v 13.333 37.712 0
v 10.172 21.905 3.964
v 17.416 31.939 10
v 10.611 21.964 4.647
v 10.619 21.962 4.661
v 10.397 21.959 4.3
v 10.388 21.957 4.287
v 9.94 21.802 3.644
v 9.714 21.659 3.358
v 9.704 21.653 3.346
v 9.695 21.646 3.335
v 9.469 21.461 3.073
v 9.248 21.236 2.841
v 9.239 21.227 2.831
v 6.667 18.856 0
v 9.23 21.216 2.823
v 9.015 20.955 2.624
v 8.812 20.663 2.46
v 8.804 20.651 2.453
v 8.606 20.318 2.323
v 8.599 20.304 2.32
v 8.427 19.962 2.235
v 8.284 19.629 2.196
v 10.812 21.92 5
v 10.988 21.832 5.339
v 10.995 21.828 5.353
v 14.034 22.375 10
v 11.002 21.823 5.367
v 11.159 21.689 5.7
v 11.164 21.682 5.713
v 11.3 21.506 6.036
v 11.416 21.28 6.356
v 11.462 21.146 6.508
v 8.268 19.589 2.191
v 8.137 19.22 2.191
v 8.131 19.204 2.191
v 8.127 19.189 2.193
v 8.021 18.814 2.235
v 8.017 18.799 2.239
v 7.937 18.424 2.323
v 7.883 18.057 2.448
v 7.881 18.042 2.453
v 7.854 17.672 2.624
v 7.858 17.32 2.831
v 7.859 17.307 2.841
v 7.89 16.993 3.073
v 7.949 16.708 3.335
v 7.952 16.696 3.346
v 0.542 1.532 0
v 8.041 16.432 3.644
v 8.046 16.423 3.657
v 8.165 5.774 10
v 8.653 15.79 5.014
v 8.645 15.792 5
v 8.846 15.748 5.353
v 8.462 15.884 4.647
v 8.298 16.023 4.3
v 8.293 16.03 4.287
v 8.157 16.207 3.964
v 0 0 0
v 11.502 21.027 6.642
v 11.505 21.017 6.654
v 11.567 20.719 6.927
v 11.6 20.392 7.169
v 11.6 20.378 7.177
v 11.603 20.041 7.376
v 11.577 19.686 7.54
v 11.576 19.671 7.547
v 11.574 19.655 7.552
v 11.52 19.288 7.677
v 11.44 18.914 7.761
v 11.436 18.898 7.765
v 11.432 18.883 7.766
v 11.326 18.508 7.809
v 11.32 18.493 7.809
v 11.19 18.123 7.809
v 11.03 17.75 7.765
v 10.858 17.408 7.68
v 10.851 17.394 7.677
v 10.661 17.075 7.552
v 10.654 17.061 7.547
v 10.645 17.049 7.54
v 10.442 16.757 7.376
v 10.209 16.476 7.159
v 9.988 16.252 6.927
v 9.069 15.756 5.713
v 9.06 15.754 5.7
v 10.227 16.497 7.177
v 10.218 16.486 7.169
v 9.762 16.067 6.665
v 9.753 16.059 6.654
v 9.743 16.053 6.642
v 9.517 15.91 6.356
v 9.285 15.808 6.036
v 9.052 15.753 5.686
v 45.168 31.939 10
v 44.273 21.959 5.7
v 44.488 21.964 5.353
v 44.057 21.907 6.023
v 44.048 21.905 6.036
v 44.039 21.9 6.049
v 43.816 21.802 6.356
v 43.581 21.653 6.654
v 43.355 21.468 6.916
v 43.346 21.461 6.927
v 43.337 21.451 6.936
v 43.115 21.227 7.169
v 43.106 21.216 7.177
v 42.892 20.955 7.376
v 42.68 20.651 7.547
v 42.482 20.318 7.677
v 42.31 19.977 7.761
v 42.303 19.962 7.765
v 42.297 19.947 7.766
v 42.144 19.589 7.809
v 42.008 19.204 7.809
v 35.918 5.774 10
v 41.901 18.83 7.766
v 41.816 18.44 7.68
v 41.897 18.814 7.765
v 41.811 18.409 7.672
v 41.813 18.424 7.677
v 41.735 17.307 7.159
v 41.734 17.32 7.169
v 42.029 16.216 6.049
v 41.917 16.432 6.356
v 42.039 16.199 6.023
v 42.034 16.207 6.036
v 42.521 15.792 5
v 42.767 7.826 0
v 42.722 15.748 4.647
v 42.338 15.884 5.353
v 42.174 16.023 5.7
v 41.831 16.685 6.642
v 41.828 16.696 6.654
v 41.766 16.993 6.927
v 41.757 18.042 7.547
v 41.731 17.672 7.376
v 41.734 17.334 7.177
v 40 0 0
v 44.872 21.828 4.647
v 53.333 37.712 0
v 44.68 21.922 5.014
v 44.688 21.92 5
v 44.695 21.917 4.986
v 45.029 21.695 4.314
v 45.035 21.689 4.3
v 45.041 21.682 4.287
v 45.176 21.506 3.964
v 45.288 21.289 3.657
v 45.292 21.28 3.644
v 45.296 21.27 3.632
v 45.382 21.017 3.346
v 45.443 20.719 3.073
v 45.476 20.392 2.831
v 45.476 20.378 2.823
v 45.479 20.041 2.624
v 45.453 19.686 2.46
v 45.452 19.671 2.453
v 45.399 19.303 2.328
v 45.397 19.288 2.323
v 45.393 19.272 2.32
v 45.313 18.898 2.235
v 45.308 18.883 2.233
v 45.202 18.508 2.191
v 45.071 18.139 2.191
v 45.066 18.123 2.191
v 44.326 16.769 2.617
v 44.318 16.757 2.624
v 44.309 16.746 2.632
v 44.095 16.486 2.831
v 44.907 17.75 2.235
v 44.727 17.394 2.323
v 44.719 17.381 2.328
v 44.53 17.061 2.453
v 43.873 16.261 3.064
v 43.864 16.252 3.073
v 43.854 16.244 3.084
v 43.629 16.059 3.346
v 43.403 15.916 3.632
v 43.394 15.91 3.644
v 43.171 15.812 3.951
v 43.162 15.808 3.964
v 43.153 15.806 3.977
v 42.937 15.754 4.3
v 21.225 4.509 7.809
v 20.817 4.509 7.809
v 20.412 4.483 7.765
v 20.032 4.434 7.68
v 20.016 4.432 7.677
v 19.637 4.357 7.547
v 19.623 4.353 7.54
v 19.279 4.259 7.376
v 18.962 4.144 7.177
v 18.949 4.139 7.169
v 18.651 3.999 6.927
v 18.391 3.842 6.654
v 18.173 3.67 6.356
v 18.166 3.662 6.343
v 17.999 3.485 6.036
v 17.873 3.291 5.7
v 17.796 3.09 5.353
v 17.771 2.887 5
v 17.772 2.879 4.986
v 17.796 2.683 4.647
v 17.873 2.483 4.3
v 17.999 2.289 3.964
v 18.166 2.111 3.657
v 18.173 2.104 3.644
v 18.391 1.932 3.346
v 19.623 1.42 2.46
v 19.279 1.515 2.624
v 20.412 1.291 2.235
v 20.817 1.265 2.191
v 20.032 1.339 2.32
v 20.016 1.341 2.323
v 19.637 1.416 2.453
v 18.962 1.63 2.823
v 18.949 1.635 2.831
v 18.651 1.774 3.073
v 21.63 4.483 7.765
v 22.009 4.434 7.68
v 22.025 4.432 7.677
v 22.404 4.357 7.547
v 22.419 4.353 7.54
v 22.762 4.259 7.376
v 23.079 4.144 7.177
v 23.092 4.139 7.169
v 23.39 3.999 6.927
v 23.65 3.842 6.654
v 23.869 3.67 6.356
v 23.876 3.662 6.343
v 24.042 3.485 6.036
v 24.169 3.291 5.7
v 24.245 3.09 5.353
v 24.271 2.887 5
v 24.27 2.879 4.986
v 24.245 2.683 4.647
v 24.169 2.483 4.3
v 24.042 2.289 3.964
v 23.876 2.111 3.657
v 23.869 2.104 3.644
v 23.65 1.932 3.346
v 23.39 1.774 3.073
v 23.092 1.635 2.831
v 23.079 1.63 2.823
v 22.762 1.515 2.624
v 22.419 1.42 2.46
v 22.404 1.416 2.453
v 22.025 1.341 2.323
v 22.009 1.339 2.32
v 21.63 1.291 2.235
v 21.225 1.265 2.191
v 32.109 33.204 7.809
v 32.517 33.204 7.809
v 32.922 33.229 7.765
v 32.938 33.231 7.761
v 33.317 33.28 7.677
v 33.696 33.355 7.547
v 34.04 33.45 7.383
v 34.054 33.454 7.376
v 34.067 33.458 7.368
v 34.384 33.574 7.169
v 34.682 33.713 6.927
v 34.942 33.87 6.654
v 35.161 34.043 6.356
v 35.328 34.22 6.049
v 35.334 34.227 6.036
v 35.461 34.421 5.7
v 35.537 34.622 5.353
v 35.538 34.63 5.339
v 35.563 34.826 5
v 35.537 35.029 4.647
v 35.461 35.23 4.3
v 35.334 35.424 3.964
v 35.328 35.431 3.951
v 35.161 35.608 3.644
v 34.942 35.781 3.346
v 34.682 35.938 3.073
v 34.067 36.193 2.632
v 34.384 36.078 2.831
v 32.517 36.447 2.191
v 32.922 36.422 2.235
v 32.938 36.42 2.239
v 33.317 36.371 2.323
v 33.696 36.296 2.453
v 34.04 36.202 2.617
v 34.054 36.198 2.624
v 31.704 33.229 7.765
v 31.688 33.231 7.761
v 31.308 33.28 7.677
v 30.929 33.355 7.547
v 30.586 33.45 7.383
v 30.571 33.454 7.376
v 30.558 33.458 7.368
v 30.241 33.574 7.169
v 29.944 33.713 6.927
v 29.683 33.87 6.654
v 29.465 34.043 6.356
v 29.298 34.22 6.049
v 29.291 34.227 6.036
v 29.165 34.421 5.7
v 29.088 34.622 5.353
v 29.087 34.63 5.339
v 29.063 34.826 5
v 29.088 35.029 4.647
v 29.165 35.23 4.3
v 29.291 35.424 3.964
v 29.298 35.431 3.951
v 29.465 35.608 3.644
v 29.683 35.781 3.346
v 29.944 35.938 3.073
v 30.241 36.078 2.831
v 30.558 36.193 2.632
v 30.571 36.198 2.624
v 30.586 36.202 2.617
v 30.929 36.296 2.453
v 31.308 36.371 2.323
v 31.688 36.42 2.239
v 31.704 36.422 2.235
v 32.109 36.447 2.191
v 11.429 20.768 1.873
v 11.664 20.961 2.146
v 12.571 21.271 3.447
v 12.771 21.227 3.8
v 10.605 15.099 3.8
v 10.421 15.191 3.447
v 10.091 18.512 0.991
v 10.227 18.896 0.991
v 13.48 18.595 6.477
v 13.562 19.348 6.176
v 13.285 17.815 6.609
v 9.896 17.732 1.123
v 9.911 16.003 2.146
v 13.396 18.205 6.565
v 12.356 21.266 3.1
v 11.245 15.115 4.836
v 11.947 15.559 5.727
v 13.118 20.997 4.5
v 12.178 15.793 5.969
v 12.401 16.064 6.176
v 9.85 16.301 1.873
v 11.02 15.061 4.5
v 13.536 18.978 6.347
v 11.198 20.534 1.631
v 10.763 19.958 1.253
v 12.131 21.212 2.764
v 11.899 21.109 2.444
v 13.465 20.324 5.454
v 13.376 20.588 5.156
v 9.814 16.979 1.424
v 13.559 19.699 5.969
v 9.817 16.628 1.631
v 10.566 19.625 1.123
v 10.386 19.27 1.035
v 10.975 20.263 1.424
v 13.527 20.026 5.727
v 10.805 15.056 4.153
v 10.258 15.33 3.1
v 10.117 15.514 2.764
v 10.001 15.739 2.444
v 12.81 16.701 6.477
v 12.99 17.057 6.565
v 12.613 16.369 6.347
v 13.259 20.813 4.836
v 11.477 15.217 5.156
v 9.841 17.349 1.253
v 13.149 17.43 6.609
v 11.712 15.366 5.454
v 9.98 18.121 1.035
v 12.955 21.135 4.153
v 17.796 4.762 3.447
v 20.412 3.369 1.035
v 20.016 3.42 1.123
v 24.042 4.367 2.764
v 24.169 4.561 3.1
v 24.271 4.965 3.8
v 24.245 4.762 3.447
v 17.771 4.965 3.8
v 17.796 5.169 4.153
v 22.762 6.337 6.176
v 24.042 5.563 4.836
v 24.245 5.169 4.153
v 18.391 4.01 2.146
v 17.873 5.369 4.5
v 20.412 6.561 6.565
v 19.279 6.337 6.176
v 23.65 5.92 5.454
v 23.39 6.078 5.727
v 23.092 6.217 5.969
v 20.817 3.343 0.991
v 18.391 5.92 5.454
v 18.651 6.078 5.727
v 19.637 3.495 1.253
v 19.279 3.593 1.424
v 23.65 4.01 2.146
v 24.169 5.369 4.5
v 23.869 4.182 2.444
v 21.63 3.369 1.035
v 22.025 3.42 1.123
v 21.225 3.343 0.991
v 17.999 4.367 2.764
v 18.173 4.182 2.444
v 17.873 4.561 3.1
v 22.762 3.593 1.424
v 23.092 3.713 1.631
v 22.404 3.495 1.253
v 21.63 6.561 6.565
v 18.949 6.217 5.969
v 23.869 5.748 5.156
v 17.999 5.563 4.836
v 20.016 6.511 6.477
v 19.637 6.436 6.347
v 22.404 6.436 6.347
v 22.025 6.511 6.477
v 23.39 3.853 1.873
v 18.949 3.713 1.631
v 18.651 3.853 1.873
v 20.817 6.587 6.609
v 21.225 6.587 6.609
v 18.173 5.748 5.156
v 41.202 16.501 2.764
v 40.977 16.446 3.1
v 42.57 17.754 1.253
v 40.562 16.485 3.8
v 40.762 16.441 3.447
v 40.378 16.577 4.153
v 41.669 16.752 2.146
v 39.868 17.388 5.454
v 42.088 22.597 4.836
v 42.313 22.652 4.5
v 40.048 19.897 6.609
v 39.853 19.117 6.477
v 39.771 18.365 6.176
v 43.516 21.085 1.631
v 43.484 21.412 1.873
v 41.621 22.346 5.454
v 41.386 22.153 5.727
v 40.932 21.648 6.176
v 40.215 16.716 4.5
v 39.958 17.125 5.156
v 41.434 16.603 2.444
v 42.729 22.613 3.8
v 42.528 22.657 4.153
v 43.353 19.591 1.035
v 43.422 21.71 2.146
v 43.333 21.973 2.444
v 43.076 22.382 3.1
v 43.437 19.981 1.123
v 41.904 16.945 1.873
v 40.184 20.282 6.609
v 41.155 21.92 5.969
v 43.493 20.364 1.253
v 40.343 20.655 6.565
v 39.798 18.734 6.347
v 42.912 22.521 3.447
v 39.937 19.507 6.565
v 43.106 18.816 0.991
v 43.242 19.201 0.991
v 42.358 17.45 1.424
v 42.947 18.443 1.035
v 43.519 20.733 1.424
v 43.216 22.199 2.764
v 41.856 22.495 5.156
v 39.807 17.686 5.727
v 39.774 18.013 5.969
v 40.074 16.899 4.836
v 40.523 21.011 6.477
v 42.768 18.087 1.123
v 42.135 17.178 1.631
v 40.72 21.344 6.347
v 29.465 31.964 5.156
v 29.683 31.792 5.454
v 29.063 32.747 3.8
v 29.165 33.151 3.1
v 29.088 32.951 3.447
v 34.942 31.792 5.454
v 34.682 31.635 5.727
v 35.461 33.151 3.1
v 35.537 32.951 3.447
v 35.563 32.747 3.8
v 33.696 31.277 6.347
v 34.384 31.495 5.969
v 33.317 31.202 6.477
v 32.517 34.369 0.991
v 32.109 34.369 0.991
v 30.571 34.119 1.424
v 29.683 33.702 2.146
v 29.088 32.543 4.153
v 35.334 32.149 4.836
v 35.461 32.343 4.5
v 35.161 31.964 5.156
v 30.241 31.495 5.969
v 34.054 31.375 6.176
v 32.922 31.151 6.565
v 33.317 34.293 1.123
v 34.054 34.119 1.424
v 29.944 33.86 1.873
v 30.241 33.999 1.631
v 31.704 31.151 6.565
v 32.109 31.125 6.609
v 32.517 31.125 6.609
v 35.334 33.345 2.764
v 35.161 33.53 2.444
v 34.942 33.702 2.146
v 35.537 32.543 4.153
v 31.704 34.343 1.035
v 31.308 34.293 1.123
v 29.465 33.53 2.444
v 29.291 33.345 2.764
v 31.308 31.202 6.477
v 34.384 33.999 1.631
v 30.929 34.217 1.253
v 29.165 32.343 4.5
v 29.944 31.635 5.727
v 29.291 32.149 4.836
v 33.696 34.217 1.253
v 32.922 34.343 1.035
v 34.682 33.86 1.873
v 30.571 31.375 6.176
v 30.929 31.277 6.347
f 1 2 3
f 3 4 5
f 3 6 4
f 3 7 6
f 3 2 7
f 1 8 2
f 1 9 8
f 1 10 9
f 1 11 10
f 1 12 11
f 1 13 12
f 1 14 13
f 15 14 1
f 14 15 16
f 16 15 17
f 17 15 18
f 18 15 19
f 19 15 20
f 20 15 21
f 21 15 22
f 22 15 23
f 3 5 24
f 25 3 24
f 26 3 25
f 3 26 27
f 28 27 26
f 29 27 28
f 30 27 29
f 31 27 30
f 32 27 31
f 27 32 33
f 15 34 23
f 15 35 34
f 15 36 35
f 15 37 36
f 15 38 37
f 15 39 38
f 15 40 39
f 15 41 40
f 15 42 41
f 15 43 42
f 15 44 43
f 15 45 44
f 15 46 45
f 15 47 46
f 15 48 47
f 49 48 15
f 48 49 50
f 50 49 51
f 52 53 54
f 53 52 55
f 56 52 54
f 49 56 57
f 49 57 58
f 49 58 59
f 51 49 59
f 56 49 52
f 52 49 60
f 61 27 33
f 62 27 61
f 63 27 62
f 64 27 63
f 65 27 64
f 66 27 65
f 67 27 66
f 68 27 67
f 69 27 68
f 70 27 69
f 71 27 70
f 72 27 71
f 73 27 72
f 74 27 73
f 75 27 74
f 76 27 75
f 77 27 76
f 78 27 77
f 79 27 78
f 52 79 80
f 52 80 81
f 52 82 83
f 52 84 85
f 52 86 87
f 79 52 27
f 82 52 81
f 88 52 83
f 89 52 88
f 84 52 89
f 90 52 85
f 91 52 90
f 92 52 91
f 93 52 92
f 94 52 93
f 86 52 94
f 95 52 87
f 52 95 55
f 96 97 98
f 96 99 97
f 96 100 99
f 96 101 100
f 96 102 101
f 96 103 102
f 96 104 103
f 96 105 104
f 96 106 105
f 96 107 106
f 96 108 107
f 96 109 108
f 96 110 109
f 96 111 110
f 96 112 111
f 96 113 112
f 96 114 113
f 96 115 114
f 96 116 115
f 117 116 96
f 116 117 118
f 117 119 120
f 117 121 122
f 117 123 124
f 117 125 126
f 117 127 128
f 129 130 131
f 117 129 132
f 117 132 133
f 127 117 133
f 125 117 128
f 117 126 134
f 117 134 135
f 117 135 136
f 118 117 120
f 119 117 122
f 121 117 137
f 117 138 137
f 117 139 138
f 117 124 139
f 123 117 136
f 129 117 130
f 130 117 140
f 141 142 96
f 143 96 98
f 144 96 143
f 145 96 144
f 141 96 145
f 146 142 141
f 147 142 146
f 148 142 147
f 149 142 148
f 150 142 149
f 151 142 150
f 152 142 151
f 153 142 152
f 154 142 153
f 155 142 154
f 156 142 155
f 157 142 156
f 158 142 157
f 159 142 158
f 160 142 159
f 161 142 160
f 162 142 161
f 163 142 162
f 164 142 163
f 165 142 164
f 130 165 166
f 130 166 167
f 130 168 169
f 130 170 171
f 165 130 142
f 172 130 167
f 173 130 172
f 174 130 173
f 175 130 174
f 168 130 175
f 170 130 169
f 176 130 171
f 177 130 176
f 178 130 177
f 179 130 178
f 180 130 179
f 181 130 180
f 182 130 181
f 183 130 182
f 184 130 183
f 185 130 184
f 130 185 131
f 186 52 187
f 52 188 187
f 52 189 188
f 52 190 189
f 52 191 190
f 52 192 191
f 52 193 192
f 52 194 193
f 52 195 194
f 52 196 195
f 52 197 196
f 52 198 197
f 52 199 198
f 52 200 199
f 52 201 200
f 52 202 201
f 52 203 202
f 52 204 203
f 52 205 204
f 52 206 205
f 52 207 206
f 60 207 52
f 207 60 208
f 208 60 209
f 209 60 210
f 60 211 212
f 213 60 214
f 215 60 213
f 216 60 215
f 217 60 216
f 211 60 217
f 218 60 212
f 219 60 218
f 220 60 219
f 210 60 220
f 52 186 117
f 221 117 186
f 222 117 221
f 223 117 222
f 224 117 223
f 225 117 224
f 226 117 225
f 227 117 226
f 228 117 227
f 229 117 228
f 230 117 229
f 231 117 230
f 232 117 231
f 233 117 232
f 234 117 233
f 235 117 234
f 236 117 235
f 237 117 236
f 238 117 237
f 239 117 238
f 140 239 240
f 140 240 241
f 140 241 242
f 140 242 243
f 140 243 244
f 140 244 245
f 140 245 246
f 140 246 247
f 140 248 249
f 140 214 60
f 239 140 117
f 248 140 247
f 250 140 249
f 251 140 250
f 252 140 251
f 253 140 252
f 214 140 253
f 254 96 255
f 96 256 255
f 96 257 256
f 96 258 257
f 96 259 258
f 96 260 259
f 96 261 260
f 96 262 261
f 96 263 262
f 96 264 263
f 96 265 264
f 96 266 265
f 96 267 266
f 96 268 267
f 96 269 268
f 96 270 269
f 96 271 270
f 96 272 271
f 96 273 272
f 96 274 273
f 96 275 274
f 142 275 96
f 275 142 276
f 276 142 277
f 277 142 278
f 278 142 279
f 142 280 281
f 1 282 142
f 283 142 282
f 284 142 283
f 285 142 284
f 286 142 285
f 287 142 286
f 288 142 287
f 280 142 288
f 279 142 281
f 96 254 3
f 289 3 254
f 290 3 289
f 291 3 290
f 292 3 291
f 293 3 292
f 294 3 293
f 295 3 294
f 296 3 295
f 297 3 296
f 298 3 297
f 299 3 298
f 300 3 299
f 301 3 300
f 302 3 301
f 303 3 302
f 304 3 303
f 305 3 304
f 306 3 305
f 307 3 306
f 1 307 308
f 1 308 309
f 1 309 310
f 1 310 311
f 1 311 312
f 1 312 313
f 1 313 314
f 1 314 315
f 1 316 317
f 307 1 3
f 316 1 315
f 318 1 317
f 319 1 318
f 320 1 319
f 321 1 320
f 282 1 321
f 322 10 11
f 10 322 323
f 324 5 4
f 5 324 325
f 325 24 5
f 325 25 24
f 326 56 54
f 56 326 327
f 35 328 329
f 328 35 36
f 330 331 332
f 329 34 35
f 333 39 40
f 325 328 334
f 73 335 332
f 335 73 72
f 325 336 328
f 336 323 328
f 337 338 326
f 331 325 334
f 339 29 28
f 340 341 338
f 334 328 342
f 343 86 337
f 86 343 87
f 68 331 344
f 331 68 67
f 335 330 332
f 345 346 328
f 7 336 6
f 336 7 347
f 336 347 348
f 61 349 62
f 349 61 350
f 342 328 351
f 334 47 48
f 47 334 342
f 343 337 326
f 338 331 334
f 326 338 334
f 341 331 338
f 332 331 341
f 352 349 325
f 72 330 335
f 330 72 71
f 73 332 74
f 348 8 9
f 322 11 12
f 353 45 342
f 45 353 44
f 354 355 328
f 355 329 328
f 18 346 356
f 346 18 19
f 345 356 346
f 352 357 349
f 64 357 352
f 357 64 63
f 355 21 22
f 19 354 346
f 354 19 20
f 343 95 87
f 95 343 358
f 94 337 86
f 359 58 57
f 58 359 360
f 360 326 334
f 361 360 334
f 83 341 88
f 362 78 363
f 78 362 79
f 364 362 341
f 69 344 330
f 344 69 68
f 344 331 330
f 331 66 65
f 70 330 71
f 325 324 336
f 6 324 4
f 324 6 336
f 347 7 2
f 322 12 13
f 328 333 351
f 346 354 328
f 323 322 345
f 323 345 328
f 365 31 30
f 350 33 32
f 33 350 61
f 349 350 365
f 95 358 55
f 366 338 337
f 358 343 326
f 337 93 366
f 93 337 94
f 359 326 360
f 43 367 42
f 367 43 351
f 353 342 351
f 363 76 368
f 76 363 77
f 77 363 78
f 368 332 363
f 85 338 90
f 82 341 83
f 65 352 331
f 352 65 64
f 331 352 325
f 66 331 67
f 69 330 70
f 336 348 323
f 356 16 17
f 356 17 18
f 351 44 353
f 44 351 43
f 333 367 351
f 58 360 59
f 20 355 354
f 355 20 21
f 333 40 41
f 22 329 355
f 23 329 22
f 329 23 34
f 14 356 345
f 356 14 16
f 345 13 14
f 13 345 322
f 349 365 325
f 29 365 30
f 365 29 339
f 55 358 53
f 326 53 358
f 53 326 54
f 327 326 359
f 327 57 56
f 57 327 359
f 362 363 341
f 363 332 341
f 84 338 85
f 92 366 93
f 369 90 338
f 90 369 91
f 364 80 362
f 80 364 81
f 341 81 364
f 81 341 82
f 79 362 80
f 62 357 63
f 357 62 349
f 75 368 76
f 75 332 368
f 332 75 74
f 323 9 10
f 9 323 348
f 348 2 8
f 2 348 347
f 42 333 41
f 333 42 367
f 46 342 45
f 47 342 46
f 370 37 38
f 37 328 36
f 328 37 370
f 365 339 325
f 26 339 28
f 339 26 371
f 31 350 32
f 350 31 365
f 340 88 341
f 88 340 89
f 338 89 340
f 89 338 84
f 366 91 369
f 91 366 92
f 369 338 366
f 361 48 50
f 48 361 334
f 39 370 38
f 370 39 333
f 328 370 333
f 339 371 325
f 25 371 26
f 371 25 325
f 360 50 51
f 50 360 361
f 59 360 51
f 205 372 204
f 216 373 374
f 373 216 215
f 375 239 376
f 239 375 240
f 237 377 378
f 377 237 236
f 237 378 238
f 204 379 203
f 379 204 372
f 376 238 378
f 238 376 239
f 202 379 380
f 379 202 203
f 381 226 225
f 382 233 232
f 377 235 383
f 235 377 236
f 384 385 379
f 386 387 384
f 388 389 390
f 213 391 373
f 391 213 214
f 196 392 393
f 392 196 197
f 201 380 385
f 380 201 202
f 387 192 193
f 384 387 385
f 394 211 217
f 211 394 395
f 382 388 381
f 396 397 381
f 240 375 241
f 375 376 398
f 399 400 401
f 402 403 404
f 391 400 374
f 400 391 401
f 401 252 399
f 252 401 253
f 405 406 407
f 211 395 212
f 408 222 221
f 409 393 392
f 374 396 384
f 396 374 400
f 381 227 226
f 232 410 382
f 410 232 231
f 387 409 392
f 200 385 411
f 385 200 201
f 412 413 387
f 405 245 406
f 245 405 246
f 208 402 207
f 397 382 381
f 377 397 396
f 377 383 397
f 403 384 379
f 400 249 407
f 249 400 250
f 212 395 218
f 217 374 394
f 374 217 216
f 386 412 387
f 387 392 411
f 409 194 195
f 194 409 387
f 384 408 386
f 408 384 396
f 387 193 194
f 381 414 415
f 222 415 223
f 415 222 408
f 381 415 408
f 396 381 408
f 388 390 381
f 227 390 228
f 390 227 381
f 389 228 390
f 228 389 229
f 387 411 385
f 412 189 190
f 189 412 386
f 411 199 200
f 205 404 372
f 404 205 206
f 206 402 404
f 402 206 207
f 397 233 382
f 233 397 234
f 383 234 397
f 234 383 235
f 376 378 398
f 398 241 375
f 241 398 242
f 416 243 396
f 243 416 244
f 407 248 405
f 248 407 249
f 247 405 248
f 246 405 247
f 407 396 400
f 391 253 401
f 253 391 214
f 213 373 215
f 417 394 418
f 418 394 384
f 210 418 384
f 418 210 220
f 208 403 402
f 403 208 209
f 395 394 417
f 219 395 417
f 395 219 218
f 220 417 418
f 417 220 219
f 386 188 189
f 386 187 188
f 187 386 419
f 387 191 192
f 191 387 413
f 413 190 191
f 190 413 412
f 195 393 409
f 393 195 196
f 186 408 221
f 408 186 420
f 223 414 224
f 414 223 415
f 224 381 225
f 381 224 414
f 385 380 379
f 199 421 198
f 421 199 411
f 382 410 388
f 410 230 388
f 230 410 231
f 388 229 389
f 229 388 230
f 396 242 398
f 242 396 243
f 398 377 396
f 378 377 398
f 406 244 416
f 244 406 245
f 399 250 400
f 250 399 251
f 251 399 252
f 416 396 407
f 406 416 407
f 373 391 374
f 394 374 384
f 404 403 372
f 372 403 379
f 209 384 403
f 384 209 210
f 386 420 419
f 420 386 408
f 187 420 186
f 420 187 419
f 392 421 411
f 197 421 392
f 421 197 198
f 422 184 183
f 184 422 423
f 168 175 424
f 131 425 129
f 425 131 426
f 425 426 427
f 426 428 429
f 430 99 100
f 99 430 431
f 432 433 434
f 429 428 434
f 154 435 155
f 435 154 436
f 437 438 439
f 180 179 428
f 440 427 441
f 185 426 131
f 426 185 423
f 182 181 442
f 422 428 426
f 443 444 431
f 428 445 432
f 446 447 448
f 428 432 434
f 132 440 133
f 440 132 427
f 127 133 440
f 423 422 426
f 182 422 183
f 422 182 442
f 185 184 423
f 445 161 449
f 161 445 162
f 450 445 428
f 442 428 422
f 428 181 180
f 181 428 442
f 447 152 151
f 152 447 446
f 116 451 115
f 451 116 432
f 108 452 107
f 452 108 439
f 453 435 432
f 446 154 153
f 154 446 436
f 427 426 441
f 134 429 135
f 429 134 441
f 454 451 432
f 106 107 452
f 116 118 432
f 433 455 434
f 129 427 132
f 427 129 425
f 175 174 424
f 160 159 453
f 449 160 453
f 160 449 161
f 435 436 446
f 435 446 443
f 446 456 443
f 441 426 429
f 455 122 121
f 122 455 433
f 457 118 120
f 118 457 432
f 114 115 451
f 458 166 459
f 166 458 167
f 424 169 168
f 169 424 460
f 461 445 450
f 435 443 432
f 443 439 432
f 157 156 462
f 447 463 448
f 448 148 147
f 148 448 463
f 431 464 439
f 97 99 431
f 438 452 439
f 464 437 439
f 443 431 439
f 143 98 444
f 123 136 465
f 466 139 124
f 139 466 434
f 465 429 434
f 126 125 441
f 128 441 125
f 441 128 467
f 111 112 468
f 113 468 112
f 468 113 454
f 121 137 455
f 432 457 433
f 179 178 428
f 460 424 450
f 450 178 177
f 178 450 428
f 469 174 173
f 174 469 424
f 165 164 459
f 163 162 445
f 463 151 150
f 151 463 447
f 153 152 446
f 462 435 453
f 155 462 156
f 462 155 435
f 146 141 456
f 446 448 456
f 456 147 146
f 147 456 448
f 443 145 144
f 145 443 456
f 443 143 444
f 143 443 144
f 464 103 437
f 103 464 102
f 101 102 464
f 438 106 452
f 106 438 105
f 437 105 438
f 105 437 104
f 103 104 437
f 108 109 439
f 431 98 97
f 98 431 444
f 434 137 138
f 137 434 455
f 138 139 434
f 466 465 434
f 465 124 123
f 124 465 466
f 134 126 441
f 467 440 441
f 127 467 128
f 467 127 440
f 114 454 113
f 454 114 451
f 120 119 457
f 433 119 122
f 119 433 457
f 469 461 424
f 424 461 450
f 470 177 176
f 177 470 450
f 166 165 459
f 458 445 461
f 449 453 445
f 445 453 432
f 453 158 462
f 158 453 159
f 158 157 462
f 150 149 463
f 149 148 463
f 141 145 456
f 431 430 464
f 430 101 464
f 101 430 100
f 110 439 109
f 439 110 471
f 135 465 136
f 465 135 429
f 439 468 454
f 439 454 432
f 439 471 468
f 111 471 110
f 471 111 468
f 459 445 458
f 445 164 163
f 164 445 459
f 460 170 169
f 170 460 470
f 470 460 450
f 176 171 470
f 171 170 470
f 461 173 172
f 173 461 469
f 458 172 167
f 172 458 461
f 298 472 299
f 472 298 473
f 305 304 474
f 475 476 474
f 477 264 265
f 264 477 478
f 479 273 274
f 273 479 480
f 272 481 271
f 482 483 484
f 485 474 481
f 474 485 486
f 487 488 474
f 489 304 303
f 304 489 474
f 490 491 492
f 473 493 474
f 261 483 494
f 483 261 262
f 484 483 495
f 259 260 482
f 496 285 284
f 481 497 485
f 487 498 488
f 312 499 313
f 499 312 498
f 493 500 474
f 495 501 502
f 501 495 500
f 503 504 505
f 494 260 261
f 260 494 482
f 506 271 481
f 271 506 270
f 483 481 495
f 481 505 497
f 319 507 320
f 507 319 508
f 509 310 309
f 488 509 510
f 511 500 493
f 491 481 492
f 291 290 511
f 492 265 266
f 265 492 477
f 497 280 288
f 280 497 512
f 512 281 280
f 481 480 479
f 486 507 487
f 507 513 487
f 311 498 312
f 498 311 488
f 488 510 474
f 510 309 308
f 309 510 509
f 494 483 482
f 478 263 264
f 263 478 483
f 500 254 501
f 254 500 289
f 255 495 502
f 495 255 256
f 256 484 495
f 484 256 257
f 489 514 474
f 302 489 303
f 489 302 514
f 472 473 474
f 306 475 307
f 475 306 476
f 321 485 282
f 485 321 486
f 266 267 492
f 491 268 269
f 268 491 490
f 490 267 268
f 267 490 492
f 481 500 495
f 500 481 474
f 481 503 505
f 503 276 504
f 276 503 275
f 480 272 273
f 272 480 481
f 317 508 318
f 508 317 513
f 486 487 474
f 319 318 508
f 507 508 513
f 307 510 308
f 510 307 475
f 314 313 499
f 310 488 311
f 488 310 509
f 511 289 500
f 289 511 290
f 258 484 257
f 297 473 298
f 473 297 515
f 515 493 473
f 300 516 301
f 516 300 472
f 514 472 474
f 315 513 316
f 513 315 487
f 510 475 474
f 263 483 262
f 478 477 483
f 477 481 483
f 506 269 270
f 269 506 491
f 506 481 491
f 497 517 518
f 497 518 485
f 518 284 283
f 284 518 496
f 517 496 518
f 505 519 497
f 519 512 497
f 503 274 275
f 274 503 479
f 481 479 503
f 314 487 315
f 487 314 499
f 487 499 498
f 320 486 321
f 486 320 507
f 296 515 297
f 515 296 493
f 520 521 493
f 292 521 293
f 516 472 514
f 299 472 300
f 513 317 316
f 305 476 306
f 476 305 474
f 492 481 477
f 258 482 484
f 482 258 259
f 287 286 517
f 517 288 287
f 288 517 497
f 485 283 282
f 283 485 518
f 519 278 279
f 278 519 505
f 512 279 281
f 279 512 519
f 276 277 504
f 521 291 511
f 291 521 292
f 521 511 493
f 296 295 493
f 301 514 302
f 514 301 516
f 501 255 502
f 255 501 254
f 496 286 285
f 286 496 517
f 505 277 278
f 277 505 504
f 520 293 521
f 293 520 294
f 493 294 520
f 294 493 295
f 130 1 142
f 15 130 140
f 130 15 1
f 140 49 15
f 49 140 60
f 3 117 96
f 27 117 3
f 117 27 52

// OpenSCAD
/*
	Rhombic Dodecahedron with magnets tile, by eshira
	Dihedral angle: 120°
	
	12 tiles total are required.
	Use axially aligned magnets (4 per tile).
	Magnet mounting per tile MUST BE IDENTICAL!
	Following the following constraints:
		-Two parallel sides have the same pole facing outward
		-Two adjacent sides have the opposite pole facing outward
    See the diagram included for more help.

*/

$fn=50;

//User Defined Variables
side = 40; //side length (all sides are equal length)
thickness = 10; //how thick (z dimension) the tile is
magnetdepth = 2.5; //depth of the magnet holes; tailor this to suit your 3d printer
magnetdiam = 6.5; //diameter of the magnet holes; tailor this to suit your 3d printer

//Other Variables
dihedral = 120; //the dihedral angle
alpha = acos(1/3); //Rhombus acute angle

//Main
tile();
//rotate([dihedral/2,0,alpha]){tile();} //Show a second tile rotated to correct relative position
//rotate([-dihedral/2,0,0]){ rotate([0,0,-alpha]){tile();}} //Show a third tile rotated to correct relative position

//Modules

module tile() {
    difference(){
        mainbody();
        union(){
            chamfers();
            magnets();
        }
    }
}

module mainbody(){
	linear_extrude(height = thickness ) {
		polygon([[0,0],[side,0],[side+side*cos(alpha),side*sin(alpha)],[side*cos(alpha),side*sin(alpha)]]);
	}
}

module chamfers() {
	rotate([(180-dihedral)/2,0,alpha]){
		linear_extrude(center=true, height=thickness*10) {
			polygon([[-5,0],[-5,thickness],[side+5,thickness],[side+5,0]]);
		}
	}

	translate([side,0,0]){
		rotate([(-180+dihedral)/2,0,alpha]){
			translate([0,-thickness,0]){
				linear_extrude(center=true, height=thickness*10) {
					polygon([[-5,0],[-5,thickness],[side,thickness],[side,0]]);
				}
			}
		}
	}
    
	rotate([(-180+dihedral)/2,0,0]){
		translate([0,-thickness,0]){
			linear_extrude(center=true, height=thickness*10) {
				polygon([[-5,0],[-5,thickness],[side,thickness],[side,0]]);
			}
		}
	}
    translate([side*cos(alpha),side*sin(alpha),0]){
        mirror([0,1,0]){
            rotate([(-180+dihedral)/2,0,0]){
                translate([0,-thickness,0]){
                    linear_extrude(center=true, height=thickness*10) {
                        polygon([[-5,0],[-5,thickness],[side,thickness],[side,0]]);
                    }
                }
			}
		}
	}
}

module magnet1() {
	ldiag = side*(sin(180-alpha)/sin(alpha/2)); // the long diagonal of the rhombus
	t_h = 0.5*side*cos(90-alpha)*(sin(0.5*dihedral)/sin(90-0.5*dihedral)); //height of the virtual 'point' of the tile
	// (If the thickness of the tile is greater than t_h, then instead of a top flat face, the tile is pyramidal)
	//Now we create a parameter in the range [0,1] representing the magnet hole height as a portion of t_h
	ptr = 0.5*thickness/t_h;
	extra=.1;
	//Place the magnet in the exact middle of the face; mix movement along long diagonal with movement along side, weighed by ptr
	translate([ptr*0.5*ldiag*cos(alpha/2)+0.5*(1-ptr)*side*cos(alpha),ptr*0.5*ldiag*sin(alpha/2)+0.5*(1-ptr)*side*sin(alpha),0.5*thickness]){
		rotate([180-dihedral/2,0,alpha]){
			translate([0,0,-extra]){
				linear_extrude(center=false,height=magnetdepth){ circle(magnetdiam/2);}
			}
		}
	}
}

module magnet2() {
	sdiag = side*(sin(alpha)/sin(90-0.5*alpha)); //short diagonal of the rhombus
	t_h = 0.5*side*cos(90-alpha)*(sin(0.5*dihedral)/sin(90-0.5*dihedral)); //height of the virtual 'point' of the tile
	// (If the thickness of the tile is greater than t_h, then instead of a top flat face, the tile is pyramidal)
	//Now we create a parameter in the range [0,1] representing the magnet hole height as a portion of t_h
	ptr = 0.5*thickness/t_h;
	extra=.1;
	//Place the magnet in the exact middle of the face; mix movement along short diagonal with movement along side, weighed by ptr

	translate([side-ptr*0.5*sdiag*cos(90-0.5*alpha)+0.5*(1-ptr)*side*cos(alpha),ptr*0.5*sdiag*sin(90-0.5*alpha)+0.5*(1-ptr)*side*sin(alpha),thickness/2]){
		rotate([180-dihedral/2,0,180+alpha]){
			translate([0,0,-extra]){
				linear_extrude(center=false,height=magnetdepth){ circle(magnetdiam/2);}
			}
		}
	}
}

module magnets() {
	magnet1();
	mirror([0,1,0]){ rotate([0,0,-alpha]){magnet1();}}	
	magnet2();
	mirror([0,1,0]){ rotate([0,0,-alpha]){magnet2();}}
}
